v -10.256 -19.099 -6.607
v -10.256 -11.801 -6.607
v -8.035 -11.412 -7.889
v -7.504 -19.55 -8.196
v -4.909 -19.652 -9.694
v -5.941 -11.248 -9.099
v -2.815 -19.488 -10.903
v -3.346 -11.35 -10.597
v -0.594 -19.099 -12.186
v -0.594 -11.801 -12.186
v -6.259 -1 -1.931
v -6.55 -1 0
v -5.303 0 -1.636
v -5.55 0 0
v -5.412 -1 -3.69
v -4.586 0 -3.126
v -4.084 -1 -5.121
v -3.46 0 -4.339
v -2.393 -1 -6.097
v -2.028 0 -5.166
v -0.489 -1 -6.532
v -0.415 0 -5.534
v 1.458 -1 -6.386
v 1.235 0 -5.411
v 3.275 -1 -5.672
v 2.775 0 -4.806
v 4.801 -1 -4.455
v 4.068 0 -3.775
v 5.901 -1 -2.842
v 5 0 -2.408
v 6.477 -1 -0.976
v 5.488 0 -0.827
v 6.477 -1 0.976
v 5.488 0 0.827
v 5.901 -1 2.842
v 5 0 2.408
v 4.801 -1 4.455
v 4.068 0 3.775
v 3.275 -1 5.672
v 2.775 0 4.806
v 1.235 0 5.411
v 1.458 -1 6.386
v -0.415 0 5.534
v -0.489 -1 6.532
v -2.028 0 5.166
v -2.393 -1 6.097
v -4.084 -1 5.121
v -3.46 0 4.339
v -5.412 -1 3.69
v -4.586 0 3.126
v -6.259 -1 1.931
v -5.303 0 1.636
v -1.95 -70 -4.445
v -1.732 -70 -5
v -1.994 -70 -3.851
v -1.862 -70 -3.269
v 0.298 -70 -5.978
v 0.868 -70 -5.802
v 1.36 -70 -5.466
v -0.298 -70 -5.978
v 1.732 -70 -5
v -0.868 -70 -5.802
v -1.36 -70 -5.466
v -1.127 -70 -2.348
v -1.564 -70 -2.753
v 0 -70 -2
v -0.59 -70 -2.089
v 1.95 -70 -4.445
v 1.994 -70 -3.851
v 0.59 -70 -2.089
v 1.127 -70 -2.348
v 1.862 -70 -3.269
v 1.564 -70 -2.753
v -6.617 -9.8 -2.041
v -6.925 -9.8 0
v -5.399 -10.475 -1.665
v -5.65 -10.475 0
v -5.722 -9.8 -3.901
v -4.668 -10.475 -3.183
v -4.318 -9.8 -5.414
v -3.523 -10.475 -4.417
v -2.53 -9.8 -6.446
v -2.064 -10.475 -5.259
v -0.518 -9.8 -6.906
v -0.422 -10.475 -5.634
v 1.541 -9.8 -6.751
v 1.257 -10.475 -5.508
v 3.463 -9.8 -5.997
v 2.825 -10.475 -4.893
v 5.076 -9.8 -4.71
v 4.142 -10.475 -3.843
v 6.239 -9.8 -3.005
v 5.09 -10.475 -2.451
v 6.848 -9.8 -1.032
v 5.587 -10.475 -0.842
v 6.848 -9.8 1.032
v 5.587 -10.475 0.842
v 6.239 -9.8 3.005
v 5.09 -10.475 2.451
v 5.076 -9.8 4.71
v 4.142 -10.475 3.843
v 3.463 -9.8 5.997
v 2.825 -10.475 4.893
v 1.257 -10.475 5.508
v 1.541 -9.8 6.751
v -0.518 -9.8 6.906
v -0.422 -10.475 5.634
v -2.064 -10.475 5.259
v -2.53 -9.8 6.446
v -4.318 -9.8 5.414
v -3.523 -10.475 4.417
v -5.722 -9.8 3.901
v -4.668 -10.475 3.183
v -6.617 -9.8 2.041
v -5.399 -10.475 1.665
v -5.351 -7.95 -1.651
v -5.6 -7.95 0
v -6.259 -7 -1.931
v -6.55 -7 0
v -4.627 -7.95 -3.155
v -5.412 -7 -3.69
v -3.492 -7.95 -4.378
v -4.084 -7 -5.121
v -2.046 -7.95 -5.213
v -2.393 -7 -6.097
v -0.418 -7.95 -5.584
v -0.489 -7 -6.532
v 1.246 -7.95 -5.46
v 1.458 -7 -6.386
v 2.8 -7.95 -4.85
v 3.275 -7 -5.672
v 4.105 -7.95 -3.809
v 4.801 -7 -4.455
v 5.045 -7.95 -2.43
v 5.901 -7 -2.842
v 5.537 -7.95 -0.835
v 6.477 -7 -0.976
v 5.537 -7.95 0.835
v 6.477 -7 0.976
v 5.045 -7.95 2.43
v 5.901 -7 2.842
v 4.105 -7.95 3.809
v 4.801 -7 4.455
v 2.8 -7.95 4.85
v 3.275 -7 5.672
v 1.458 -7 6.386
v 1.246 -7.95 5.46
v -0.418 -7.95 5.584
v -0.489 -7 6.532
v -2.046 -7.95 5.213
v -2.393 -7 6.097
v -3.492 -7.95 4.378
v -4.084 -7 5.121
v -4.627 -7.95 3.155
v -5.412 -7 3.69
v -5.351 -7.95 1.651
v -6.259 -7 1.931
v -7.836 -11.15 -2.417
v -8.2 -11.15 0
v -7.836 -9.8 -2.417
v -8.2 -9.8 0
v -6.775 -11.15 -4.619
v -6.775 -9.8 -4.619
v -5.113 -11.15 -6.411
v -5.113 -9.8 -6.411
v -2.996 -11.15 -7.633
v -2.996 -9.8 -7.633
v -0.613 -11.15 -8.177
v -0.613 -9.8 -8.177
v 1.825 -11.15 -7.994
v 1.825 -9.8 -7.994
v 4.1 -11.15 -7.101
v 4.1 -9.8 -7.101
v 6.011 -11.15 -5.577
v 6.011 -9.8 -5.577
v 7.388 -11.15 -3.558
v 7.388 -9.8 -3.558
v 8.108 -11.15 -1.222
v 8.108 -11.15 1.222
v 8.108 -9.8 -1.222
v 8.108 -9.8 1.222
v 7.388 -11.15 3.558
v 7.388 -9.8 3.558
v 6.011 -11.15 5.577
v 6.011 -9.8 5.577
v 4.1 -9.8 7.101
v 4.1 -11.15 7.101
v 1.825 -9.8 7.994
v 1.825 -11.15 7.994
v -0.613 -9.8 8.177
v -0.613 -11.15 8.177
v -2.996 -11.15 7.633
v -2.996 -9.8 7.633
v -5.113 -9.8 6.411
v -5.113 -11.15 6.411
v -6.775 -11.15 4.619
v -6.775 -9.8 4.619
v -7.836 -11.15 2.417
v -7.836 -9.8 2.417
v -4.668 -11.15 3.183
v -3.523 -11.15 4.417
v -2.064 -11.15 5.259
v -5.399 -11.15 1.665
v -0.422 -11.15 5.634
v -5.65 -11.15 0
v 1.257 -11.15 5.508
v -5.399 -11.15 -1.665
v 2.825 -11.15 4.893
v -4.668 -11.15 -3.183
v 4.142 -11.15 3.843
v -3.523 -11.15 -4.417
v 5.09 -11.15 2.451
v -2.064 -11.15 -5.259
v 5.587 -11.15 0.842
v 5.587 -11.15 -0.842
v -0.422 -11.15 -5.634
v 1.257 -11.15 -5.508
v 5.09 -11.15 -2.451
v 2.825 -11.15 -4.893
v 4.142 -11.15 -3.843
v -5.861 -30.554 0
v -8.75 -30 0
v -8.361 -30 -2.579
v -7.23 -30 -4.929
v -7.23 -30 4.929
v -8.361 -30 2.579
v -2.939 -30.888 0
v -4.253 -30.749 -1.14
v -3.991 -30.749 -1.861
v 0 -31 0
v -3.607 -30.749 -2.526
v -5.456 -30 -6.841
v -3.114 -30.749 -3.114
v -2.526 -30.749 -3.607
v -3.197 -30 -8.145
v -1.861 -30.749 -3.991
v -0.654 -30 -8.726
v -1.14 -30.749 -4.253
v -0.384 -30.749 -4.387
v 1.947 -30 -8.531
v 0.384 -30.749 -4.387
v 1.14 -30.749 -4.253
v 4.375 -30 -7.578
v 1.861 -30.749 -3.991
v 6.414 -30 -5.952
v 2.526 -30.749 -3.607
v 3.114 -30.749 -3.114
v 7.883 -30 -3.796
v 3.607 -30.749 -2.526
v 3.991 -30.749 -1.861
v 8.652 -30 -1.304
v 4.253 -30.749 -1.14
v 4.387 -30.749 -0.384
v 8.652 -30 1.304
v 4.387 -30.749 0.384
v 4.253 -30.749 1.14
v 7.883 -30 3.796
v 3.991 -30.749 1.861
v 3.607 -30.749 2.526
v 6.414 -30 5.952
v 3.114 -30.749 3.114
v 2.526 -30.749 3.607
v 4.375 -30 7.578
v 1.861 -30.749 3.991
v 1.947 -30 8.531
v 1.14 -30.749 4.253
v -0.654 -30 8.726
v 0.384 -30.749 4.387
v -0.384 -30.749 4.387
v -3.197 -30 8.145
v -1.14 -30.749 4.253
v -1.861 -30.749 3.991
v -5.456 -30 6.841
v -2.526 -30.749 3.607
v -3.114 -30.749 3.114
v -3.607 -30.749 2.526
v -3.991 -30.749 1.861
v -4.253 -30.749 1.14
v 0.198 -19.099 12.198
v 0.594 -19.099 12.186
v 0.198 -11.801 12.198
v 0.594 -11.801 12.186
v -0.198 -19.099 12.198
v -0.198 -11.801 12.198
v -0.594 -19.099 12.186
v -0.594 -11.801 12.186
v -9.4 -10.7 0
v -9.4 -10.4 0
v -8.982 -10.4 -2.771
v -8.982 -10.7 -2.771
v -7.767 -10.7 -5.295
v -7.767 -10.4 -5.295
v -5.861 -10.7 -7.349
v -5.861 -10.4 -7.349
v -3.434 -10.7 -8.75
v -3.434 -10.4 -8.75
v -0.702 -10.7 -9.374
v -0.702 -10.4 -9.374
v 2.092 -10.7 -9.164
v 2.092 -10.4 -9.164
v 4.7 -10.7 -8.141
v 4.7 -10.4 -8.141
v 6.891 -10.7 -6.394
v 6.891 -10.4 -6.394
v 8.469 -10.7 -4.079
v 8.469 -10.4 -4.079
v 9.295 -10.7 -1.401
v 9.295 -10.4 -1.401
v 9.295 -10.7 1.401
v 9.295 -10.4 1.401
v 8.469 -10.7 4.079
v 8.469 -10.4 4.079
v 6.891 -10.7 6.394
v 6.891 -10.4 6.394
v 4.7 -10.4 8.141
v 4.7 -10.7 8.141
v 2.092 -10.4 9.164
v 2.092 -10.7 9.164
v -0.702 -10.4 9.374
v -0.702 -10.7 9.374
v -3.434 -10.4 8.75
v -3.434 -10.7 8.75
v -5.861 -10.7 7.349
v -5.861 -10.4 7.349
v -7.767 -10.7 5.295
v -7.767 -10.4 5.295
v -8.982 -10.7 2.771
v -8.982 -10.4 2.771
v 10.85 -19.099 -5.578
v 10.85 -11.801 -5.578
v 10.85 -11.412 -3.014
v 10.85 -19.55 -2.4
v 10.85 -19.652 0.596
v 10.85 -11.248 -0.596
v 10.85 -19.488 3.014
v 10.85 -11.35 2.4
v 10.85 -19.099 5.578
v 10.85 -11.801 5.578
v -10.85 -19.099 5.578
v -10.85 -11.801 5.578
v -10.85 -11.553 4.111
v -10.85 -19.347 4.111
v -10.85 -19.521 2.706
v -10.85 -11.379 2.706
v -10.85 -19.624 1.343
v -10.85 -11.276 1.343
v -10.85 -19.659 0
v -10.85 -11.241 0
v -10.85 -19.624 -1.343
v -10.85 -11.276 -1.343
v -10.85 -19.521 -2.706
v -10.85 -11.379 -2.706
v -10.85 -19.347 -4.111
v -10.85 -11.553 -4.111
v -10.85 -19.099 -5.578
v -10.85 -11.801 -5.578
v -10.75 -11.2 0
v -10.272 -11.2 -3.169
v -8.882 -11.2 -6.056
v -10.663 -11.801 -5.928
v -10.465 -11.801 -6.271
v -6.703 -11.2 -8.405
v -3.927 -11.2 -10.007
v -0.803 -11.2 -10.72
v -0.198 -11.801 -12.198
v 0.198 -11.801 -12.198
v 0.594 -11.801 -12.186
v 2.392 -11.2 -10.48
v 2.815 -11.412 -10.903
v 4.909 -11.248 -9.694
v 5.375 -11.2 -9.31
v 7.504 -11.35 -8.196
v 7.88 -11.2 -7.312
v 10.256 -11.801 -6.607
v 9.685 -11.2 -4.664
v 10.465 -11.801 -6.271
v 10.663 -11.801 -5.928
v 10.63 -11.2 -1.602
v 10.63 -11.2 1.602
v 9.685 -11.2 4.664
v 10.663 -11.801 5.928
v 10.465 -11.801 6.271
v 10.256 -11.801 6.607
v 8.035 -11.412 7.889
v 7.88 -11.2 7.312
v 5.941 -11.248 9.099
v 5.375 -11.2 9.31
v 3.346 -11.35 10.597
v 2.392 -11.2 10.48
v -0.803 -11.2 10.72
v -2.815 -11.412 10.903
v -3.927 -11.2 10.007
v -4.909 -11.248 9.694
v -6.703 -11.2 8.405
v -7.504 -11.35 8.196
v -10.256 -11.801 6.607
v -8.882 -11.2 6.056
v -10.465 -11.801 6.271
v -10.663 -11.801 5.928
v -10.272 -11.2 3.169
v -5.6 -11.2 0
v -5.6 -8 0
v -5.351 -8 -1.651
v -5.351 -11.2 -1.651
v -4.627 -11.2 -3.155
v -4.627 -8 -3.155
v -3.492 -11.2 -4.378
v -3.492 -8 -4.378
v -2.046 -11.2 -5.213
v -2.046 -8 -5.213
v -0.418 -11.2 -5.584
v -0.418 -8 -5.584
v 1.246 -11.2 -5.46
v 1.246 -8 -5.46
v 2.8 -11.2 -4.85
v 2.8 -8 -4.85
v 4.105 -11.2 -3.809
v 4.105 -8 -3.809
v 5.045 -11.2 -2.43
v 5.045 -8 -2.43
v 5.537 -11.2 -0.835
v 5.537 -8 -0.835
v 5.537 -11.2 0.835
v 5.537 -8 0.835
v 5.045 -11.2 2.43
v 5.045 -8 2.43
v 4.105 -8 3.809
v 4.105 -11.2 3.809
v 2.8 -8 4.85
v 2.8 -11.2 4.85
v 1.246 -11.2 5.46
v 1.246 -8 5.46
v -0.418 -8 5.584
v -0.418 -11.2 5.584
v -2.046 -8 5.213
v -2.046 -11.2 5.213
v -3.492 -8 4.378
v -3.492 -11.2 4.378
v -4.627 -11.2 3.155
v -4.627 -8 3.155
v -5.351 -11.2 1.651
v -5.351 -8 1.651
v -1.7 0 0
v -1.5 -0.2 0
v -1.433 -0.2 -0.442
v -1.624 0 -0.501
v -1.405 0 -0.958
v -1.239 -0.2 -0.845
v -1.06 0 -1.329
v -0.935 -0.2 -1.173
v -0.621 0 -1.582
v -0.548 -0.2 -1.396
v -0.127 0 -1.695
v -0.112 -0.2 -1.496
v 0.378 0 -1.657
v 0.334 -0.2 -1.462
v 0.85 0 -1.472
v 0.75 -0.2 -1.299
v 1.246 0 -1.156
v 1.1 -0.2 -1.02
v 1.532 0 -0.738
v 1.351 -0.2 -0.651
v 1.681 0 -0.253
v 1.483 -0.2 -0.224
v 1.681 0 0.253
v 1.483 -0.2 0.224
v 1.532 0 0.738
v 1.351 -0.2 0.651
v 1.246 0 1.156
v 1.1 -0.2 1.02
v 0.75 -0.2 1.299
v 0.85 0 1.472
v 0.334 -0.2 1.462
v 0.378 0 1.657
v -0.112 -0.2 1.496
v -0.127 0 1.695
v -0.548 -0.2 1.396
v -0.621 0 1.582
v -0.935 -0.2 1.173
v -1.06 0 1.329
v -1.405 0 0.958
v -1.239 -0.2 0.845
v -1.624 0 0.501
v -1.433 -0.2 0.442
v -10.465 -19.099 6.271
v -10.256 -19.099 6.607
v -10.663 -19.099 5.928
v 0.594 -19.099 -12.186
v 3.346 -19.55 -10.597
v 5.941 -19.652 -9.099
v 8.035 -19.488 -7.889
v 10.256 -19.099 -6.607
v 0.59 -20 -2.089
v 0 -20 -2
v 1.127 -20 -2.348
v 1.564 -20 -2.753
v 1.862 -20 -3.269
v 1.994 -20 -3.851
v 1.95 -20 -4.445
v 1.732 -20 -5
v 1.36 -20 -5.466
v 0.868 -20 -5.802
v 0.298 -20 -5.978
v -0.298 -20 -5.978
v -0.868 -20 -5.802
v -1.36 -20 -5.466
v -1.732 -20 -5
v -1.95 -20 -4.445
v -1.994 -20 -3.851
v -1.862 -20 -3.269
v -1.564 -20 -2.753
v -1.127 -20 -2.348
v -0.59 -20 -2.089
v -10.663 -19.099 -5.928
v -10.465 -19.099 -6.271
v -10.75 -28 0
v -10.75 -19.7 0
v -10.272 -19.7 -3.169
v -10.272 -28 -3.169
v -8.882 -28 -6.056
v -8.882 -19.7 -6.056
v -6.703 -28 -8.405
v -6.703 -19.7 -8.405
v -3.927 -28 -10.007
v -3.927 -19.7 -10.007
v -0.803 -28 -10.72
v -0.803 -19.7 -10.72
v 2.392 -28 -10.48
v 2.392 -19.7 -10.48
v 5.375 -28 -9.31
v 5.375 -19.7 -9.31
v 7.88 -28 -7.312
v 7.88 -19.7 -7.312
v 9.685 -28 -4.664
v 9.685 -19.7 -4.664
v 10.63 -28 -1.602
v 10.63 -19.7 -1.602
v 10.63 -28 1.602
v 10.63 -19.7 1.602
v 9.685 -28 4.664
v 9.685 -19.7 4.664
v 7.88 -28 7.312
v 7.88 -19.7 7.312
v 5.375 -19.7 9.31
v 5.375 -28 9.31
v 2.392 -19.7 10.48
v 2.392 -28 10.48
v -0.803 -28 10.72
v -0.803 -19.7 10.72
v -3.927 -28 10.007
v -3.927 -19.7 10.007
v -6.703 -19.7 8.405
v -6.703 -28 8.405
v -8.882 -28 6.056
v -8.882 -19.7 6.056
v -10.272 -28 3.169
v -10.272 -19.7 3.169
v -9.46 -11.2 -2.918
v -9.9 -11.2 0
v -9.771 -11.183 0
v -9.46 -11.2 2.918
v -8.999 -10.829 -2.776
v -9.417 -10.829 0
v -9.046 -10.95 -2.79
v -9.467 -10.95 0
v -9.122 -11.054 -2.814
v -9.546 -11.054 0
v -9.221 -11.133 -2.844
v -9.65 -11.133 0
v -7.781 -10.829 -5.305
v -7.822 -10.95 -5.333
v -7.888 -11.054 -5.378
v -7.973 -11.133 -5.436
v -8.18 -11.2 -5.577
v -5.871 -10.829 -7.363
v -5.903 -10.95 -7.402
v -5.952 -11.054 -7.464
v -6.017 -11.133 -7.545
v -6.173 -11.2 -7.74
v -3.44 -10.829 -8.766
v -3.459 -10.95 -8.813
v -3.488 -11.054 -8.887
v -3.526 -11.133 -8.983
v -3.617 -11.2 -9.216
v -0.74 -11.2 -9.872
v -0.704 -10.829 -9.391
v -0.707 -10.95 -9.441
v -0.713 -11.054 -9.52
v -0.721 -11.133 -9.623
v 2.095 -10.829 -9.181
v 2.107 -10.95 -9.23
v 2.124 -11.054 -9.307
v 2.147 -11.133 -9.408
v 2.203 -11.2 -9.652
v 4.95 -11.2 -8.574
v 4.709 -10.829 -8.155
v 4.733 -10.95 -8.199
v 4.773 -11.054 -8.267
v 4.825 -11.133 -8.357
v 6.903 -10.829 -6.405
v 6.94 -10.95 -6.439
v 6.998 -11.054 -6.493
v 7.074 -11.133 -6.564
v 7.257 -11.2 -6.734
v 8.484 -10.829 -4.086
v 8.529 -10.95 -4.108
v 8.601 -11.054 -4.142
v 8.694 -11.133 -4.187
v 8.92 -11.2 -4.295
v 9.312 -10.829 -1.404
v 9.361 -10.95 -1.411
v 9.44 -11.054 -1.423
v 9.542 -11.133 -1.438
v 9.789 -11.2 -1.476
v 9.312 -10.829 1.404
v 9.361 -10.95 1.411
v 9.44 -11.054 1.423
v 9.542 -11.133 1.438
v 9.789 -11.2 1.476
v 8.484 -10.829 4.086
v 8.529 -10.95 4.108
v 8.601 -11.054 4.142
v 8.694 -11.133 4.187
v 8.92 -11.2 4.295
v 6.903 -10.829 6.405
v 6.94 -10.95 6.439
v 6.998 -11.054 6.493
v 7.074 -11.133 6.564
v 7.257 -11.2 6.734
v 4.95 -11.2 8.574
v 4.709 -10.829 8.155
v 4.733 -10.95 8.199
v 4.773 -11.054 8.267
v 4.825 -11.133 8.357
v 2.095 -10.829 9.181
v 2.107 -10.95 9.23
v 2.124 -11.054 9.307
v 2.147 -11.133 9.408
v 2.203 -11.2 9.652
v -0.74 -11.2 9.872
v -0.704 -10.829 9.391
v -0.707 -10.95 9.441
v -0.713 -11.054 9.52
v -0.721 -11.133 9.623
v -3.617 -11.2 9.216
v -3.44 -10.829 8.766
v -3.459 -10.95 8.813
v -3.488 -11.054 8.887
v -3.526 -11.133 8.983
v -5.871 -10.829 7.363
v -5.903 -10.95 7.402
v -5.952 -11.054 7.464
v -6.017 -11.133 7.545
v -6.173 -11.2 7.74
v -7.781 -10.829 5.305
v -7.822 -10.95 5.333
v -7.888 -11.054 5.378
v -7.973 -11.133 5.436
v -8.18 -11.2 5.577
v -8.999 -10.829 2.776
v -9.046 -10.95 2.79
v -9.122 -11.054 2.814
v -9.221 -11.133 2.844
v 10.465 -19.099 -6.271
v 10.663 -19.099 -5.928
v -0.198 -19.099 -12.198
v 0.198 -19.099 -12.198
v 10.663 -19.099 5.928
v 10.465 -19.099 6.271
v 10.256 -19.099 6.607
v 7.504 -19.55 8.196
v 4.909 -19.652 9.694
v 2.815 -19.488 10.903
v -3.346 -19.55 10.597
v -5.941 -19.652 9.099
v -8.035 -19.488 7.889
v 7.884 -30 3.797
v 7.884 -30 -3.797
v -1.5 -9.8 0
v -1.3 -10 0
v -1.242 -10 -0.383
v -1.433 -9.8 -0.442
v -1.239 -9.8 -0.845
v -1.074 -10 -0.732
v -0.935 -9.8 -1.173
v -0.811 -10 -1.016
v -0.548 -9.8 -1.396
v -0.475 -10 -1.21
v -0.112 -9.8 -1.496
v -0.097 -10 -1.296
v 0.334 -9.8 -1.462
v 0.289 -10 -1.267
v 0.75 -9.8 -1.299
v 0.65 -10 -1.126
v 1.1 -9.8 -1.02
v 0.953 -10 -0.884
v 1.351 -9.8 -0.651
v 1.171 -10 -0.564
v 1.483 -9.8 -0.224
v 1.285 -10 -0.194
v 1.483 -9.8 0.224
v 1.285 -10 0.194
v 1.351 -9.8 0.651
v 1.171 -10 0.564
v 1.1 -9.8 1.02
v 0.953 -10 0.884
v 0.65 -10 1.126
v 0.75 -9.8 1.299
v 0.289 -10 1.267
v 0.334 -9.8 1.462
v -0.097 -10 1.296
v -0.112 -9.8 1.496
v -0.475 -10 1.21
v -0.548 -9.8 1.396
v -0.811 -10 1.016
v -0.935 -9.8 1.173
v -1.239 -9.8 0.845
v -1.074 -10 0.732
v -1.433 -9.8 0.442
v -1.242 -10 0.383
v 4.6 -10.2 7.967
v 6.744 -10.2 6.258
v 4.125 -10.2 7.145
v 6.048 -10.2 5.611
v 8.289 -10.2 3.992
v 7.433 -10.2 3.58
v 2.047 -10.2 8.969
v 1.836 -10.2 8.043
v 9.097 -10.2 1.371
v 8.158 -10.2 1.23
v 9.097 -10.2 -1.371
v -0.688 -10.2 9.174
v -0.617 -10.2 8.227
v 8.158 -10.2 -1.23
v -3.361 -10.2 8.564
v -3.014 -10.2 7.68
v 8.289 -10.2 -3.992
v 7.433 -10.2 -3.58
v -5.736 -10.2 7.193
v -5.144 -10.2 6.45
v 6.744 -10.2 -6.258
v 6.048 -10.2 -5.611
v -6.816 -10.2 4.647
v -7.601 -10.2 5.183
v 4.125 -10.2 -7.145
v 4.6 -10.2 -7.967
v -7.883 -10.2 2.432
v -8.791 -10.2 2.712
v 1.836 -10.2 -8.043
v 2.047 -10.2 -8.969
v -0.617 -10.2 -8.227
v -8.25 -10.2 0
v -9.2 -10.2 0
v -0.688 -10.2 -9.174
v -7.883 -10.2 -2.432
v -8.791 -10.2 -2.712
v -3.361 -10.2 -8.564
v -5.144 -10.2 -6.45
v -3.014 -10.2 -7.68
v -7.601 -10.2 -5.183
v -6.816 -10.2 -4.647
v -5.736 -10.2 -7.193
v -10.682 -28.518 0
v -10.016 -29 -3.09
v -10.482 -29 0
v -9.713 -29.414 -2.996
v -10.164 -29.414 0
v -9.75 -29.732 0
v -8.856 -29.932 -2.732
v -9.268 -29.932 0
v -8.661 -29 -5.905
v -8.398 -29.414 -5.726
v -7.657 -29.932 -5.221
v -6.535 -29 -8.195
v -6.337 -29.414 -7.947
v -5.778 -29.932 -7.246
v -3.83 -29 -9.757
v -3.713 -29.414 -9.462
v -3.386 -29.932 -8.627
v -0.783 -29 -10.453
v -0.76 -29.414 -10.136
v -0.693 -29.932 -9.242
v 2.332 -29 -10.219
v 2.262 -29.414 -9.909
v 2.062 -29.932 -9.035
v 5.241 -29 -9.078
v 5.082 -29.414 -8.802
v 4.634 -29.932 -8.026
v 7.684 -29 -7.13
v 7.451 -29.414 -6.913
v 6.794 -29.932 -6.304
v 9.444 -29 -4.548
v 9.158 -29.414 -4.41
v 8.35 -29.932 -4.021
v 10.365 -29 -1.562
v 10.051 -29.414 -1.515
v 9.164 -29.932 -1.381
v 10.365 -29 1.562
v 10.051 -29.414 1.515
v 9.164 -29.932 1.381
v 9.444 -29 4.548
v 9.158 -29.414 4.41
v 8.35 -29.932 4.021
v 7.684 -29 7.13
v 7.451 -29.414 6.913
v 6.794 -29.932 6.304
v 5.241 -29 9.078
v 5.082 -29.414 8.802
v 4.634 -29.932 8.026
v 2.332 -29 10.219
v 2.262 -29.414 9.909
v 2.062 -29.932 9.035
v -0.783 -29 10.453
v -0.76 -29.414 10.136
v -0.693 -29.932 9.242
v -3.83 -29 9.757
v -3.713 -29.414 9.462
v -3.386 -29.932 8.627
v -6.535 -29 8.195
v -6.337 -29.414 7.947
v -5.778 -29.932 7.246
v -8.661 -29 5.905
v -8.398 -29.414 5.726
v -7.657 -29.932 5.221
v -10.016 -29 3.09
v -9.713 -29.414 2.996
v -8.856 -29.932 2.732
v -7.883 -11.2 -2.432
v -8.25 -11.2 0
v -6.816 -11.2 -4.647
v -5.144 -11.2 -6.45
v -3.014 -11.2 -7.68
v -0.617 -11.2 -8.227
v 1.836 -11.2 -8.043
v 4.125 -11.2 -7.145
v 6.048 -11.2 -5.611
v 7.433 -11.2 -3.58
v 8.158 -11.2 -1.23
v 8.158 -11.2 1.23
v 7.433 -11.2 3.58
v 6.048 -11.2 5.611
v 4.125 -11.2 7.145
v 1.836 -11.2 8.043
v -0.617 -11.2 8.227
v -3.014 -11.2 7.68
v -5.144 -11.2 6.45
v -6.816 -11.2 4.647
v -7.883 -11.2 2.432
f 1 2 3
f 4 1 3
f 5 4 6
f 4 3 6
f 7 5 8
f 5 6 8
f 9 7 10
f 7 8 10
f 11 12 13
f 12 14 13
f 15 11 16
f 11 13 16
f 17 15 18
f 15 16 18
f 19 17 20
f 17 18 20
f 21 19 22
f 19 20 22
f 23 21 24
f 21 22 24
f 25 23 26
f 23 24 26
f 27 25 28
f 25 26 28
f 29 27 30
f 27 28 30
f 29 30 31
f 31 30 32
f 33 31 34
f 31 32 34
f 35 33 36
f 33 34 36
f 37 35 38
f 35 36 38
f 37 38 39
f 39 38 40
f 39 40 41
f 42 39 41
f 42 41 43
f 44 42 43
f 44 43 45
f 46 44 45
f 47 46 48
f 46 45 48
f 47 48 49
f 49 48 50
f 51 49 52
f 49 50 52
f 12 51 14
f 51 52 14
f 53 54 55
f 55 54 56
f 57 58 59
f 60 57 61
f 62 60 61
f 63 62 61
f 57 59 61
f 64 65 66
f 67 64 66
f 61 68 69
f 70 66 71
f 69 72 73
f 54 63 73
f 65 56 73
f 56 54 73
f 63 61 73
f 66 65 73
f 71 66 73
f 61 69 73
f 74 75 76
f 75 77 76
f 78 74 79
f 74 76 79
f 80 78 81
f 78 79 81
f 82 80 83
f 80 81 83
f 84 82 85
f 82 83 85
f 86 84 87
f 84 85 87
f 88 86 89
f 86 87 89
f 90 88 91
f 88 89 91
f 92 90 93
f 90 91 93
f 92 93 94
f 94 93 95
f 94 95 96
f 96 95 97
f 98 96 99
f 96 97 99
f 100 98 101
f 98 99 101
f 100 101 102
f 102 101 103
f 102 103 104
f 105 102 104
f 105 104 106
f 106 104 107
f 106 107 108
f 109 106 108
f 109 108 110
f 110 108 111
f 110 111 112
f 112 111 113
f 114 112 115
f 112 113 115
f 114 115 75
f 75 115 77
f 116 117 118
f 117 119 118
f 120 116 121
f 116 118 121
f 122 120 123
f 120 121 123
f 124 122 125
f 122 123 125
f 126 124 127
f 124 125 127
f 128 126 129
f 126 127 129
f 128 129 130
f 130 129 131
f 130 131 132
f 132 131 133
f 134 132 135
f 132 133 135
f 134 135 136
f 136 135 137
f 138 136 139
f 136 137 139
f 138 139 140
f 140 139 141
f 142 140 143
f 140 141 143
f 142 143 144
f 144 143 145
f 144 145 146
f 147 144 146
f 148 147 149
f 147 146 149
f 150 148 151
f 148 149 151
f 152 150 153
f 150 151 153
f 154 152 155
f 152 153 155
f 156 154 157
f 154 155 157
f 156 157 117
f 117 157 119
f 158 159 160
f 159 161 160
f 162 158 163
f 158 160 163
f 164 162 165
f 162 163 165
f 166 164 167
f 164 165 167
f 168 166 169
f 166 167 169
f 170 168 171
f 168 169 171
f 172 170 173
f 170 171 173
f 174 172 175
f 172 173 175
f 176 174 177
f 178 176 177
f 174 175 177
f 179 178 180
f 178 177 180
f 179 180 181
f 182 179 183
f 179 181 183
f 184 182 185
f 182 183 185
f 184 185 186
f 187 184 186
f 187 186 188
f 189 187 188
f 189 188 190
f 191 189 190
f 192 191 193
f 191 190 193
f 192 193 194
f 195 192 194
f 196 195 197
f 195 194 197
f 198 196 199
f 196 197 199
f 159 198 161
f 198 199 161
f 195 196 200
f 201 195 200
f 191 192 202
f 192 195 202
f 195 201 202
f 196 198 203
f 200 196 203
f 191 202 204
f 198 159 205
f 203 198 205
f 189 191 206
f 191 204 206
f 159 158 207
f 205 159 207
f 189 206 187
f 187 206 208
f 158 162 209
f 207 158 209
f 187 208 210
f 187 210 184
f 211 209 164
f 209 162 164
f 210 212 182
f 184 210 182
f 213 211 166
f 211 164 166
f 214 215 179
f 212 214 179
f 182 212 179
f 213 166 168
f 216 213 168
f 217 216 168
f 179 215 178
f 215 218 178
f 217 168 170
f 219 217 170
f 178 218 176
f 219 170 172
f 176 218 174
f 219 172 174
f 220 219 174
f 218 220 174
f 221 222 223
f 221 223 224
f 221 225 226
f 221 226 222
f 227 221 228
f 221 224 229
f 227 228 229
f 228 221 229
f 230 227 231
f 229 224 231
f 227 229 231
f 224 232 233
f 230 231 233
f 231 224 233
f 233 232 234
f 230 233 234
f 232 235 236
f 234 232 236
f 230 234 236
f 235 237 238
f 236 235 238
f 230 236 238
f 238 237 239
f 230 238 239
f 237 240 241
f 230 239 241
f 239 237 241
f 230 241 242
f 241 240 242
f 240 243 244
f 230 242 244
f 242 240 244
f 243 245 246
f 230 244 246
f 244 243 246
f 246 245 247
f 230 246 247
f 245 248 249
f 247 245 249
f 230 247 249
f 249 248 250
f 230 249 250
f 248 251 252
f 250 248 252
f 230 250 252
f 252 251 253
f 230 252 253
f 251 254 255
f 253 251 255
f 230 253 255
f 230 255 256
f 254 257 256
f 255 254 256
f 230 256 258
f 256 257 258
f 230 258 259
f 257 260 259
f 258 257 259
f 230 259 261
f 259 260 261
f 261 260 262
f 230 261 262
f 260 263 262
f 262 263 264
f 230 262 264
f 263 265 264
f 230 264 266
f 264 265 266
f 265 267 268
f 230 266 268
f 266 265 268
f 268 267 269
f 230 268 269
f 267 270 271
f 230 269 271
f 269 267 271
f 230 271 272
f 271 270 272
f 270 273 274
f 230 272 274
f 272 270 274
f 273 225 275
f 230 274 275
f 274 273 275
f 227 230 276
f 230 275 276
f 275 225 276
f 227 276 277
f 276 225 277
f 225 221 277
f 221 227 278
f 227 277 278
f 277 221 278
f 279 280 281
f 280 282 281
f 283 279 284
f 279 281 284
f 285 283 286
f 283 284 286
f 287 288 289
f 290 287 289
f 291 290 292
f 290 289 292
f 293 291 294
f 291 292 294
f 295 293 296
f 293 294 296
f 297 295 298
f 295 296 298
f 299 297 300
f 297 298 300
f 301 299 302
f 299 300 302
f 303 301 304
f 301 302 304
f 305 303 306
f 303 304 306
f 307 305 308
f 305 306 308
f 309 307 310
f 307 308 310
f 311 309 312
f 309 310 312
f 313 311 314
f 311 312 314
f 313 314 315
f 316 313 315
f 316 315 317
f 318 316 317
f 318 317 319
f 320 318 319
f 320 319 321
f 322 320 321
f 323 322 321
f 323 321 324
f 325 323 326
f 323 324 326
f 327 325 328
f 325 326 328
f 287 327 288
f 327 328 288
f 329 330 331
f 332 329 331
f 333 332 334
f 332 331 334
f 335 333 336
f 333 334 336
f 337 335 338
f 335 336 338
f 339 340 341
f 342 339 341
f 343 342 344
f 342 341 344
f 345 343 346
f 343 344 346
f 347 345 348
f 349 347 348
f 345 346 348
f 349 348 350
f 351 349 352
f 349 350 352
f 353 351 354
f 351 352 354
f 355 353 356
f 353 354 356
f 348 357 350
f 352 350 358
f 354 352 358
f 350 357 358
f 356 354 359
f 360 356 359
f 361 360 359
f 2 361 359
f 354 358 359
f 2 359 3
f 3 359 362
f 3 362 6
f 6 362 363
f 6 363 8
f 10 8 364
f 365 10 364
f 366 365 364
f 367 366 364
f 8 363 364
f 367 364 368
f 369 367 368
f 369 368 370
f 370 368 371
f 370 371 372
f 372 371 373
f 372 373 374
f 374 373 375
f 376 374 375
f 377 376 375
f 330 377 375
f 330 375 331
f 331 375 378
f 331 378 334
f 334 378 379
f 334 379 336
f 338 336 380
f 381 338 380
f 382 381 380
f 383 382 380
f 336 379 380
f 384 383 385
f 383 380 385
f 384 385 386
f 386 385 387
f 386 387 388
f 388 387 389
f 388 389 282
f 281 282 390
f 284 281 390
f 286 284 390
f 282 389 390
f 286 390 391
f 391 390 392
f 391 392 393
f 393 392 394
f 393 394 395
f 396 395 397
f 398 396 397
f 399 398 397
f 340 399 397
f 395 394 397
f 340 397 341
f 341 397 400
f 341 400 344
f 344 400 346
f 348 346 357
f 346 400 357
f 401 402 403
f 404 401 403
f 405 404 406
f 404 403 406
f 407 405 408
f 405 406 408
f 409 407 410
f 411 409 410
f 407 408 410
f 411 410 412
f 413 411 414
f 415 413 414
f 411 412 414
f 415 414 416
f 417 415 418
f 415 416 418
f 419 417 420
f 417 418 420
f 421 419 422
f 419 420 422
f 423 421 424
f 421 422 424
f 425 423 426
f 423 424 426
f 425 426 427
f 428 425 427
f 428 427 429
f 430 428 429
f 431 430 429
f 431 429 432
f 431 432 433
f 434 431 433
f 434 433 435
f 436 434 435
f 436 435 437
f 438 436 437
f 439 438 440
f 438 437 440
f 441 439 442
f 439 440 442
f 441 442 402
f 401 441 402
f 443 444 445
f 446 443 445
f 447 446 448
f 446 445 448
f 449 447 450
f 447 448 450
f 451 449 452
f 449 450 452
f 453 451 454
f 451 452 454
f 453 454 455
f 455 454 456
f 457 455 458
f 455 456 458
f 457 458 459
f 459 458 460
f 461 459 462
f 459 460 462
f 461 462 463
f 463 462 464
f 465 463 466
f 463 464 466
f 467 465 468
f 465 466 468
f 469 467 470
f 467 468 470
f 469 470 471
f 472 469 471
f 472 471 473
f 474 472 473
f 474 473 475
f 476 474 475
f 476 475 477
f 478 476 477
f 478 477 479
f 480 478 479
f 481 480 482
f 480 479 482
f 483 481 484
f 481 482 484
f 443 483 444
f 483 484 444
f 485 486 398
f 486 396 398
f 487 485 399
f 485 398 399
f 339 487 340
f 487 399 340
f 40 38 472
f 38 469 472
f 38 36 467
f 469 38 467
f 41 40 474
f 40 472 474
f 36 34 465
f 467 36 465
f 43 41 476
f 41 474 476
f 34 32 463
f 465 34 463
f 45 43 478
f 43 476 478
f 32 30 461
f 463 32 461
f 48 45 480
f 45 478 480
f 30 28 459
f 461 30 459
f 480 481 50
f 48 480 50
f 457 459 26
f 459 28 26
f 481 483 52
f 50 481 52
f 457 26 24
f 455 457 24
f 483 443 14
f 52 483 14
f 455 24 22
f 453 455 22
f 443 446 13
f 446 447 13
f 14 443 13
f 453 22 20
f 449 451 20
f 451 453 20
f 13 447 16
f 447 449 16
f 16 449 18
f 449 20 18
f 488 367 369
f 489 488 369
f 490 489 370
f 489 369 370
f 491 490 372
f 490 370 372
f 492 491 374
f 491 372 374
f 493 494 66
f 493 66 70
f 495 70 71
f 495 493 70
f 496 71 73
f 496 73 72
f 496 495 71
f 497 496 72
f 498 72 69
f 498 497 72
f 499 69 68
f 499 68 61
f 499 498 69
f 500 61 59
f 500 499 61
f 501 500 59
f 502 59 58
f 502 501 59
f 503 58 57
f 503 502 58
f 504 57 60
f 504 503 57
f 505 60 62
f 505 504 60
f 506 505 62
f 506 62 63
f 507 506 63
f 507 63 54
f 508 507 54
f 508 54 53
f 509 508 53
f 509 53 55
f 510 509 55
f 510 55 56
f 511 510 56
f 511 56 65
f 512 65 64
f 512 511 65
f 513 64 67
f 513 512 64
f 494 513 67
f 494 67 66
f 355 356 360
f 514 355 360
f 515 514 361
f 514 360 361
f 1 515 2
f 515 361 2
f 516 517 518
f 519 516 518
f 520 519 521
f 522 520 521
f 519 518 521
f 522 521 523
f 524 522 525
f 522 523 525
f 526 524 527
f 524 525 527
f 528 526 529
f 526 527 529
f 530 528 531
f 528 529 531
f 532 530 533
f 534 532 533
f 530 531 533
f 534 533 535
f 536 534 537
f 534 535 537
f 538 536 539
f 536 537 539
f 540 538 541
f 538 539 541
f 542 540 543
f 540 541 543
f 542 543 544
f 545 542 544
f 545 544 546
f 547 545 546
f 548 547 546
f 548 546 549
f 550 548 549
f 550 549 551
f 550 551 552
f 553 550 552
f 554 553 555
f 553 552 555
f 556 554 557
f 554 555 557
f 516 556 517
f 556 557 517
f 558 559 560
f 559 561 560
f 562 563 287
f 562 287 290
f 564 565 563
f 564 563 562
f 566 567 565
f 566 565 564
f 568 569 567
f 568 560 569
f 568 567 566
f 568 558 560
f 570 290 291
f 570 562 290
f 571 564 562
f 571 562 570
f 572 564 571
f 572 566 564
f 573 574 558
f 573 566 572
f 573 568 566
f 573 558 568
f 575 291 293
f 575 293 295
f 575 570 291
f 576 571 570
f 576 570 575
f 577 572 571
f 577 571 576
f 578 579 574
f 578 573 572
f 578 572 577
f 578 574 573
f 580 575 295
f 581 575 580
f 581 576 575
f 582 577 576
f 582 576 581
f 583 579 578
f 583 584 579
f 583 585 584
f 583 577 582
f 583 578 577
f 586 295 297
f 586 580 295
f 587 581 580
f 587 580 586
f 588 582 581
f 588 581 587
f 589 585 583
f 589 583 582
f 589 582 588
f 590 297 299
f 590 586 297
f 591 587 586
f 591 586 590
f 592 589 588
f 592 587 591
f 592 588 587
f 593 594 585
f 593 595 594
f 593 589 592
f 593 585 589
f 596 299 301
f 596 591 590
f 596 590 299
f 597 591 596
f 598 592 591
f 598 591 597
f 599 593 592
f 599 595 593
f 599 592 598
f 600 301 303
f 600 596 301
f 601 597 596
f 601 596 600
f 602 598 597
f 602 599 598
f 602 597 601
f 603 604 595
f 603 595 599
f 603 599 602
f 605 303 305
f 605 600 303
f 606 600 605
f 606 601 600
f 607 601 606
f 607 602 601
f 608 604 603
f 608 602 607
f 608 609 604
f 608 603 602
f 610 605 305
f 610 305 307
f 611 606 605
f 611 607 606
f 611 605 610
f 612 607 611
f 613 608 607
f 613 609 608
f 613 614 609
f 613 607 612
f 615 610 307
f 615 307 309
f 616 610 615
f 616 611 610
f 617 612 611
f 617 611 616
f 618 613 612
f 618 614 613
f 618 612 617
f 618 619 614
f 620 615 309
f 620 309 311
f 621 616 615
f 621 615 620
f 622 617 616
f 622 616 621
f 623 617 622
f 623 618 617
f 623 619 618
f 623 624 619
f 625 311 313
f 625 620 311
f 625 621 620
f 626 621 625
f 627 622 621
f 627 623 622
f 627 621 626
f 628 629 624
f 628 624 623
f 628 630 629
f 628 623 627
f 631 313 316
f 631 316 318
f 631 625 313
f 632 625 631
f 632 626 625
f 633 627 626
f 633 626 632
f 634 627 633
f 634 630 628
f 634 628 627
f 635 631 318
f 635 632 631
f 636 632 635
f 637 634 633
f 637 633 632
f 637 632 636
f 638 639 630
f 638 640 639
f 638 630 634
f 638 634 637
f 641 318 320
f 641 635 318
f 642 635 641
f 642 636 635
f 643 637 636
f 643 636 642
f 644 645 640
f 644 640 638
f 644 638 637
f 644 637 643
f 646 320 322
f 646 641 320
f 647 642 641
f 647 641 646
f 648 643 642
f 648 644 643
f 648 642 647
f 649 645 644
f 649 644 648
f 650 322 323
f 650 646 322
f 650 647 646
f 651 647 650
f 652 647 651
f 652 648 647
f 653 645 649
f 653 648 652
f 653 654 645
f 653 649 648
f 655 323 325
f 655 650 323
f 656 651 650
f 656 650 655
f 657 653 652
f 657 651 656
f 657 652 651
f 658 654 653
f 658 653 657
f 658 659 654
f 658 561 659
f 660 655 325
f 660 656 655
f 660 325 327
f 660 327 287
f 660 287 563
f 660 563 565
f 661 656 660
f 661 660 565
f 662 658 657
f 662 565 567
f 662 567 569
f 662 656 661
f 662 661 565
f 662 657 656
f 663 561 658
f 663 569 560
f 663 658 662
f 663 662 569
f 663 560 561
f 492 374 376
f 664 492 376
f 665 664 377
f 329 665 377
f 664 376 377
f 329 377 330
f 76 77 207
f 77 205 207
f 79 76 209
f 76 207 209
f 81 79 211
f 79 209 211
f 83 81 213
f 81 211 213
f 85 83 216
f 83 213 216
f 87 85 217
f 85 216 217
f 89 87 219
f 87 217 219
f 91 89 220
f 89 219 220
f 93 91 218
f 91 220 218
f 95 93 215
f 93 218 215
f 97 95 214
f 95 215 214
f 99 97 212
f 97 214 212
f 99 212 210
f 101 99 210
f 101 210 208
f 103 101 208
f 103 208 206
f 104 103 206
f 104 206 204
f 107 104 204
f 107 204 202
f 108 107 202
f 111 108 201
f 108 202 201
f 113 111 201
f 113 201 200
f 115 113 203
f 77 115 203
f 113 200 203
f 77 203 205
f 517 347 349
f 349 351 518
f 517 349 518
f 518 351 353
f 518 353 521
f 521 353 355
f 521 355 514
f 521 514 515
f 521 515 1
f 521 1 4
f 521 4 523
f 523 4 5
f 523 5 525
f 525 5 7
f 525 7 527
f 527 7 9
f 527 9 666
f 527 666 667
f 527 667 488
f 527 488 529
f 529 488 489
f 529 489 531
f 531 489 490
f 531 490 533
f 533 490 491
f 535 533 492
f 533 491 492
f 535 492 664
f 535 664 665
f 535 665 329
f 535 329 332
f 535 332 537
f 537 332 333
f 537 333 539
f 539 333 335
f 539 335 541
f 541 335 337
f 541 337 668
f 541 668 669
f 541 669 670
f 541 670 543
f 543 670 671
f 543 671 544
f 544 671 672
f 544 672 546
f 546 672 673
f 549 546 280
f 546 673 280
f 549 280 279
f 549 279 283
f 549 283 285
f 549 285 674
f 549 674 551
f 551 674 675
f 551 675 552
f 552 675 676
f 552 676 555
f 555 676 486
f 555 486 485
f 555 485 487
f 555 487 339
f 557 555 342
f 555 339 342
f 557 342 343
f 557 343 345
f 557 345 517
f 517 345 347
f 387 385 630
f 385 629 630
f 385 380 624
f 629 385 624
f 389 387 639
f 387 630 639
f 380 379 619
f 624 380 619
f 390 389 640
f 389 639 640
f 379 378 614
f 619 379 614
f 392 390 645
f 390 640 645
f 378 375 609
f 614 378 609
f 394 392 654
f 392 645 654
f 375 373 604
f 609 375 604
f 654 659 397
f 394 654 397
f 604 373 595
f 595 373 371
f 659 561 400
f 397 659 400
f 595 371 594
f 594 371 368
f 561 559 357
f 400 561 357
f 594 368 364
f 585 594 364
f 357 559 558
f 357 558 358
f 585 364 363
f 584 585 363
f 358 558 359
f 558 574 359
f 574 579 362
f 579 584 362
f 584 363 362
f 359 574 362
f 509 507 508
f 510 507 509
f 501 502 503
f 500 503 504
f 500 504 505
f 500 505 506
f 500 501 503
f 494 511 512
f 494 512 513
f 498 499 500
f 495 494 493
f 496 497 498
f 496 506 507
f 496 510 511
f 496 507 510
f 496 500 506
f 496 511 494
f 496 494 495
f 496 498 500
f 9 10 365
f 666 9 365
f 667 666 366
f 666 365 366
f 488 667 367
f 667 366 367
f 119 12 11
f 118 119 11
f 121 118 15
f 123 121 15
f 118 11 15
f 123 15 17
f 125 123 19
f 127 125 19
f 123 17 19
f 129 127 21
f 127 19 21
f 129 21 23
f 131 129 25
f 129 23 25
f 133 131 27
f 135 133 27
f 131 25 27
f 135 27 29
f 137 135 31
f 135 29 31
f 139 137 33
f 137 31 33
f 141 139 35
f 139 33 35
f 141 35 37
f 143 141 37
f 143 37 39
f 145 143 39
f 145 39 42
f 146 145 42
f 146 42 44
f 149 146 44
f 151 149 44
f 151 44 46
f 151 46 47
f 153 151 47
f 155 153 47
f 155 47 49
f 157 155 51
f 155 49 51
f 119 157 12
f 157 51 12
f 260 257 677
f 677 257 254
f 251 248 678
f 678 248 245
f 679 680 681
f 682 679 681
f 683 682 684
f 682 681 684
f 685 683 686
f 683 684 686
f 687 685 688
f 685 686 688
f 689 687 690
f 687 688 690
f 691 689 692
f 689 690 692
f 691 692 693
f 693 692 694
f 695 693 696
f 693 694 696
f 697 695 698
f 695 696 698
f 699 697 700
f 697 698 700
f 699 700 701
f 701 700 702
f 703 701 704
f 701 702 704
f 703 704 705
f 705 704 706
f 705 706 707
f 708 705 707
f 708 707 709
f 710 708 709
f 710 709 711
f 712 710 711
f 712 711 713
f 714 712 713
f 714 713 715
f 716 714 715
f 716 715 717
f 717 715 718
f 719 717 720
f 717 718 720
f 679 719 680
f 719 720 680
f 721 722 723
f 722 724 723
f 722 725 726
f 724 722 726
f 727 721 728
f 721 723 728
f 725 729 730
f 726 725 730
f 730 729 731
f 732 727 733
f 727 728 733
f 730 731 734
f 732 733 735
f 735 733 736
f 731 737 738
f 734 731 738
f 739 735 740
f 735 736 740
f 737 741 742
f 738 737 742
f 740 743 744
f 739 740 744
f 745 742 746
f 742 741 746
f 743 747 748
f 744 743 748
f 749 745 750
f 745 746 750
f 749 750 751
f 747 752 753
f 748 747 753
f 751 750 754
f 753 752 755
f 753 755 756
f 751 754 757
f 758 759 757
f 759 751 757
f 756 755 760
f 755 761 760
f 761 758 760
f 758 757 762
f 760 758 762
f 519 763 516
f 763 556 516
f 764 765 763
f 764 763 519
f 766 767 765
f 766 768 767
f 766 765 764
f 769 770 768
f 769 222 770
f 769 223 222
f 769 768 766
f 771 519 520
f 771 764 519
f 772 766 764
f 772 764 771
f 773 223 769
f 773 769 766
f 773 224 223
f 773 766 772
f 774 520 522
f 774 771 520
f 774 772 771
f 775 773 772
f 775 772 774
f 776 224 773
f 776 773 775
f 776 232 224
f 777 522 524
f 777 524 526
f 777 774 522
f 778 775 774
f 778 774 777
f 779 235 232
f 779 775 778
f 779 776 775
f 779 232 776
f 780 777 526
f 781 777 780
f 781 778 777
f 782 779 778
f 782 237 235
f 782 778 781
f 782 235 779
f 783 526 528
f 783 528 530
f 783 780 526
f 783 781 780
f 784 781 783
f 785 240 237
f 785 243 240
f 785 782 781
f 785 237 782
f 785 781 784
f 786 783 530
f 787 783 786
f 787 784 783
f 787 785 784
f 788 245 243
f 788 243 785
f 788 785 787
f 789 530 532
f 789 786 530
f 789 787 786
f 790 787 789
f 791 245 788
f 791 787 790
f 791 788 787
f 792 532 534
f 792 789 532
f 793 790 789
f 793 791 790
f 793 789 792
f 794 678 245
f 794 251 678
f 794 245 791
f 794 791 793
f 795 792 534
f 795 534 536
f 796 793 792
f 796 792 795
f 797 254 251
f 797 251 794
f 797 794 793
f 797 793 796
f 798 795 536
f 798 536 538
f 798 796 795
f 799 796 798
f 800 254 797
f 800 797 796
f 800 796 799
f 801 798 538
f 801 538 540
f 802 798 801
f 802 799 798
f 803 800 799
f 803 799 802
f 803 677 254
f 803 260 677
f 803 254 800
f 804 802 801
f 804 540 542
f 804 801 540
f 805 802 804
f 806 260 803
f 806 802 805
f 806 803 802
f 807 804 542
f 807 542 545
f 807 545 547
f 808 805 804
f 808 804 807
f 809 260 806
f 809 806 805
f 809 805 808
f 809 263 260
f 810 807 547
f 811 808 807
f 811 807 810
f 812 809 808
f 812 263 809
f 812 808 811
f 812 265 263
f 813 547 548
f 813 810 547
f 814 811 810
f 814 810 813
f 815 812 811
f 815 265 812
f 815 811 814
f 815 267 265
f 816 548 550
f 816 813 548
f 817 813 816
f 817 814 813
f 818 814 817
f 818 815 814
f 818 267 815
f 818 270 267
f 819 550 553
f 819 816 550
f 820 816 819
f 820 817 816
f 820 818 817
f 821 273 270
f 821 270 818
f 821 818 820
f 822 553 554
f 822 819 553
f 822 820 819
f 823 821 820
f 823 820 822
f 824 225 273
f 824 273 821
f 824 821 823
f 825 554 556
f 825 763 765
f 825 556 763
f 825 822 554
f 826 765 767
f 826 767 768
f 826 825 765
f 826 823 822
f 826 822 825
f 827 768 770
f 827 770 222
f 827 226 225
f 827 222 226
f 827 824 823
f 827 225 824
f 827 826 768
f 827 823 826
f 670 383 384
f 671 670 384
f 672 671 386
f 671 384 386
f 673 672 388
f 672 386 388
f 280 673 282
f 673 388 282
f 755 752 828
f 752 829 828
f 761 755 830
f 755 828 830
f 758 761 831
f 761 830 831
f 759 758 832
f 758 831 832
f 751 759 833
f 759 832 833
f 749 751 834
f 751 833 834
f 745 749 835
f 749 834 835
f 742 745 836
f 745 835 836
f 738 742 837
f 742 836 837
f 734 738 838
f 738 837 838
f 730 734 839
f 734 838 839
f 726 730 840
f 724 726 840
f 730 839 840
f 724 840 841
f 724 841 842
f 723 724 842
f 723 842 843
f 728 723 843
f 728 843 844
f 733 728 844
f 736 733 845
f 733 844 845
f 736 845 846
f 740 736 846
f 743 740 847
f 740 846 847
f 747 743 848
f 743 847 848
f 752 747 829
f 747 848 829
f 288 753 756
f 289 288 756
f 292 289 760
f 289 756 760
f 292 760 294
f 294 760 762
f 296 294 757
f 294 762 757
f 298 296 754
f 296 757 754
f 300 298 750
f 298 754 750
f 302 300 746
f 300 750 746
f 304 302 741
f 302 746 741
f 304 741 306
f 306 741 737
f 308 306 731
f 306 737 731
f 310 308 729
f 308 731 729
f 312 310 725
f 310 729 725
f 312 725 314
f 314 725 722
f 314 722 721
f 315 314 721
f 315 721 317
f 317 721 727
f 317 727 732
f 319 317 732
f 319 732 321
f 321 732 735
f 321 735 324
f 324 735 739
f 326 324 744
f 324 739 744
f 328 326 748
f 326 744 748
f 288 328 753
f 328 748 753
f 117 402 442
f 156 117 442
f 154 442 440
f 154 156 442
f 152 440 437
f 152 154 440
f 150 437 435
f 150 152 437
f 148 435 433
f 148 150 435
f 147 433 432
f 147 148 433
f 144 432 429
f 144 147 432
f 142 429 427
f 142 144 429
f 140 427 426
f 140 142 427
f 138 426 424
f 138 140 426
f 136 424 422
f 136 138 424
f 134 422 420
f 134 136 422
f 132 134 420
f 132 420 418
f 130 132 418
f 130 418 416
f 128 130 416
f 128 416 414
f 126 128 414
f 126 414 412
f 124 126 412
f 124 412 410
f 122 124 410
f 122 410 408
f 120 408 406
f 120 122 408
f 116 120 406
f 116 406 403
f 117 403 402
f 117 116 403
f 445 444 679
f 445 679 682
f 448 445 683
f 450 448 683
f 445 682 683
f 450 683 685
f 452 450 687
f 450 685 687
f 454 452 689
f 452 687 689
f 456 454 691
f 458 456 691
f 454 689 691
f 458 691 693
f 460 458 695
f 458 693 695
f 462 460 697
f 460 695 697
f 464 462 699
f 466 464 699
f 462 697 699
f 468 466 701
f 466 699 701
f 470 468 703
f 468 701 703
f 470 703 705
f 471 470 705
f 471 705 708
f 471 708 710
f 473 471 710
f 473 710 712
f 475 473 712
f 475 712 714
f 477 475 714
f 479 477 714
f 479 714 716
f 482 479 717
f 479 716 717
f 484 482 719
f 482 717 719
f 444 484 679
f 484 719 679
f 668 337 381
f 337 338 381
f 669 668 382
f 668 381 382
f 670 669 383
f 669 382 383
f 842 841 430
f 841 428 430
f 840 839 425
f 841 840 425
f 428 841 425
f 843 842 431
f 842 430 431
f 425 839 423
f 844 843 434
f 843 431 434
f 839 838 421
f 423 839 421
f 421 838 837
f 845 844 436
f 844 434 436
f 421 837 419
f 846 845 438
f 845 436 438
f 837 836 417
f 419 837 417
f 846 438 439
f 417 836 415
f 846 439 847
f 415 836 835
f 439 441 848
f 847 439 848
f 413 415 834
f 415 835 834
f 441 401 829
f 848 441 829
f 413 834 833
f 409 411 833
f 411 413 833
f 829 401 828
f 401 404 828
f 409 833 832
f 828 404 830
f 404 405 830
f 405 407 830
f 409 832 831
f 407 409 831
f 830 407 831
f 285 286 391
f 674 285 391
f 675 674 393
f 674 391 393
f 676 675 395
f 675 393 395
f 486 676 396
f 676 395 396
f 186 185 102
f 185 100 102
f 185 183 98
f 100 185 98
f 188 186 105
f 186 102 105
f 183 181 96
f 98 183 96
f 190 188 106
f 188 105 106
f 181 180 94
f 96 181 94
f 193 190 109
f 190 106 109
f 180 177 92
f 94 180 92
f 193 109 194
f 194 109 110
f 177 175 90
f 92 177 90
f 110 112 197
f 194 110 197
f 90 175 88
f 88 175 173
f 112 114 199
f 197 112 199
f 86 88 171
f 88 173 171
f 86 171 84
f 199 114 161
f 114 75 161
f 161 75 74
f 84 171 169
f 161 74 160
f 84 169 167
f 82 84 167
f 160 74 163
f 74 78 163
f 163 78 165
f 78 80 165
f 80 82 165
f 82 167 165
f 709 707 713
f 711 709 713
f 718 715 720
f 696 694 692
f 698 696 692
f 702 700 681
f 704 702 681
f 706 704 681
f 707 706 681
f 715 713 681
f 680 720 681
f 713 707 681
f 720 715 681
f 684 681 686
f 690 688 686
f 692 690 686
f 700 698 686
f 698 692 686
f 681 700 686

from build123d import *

# Parameters (mm, degrees)
CUT_EXTRUDE2_DEPTH  = 36.477880433
FILLET1_R           = 2
CHAMFER1_SIZE       = 1
CHAMFER2_SIZE       = 0.2
FILLET2_R           = 0.5
BOSS_EXTRUDE1_START = -20
SKETCH5_R           = 2
BOSS_EXTRUDE1_DEPTH = 50


# Some blends are built 0.0001 mm under size
with BuildPart() as part:
    # Sketch1 → Revolve1 (revolve)
    with BuildSketch(Plane.XY, mode=Mode.PRIVATE) as revolve1_sk:
        with BuildLine():
            Line((10.75, -30), (10.75, -19.7))
            Line((10.75, -19.7), (12.2, -19.099390335))
            Line((12.2, -19.099390335), (12.2, -11.800609665))
            Line((12.2, -11.800609665), (10.75, -11.2))
            Line((10.75, -11.2), (9.4, -11.2))
            Line((9.4, -11.2), (9.4, -10.2))
            Line((9.4, -10.2), (8.25, -10.2))
            Line((8.25, -10.2), (8.25, -11.2))
            Line((8.25, -11.2), (5.6, -11.2))
            Line((5.6, -11.2), (5.6, -8))
            Line((5.6, -8), (6.55, -8))
            Line((6.55, -8), (6.55, 0))
            Line((6.55, 0), (1.5, 0))
            Line((1.5, 0), (1.5, -10))
            Line((1.5, -10), (0, -10))
            Line((0, -10), (0, -31))
            ThreePointArc((0, -31), (4.403478738, -30.749188961), (8.75, -30))
            Line((8.75, -30), (10.75, -30))
        make_face()
        Polygon((5.65, -11.15), (8.2, -11.15), (8.2, -9.8), (6.925, -9.8), (5.65, -10.475), align=None)
    revolve(revolve1_sk.sketch.rotate(Axis((0, 0, 0), (0, -1, 0)), 180), axis=Axis((0, 0, 0), (0, -1, 0)))

    # Sketch2 → Cut-Extrude2 (cut, through all)
    with BuildSketch(Plane(origin=(0, 0, 0), x_dir=(1, 0, 0), z_dir=(0, 1, 0))):
        with BuildLine():
            Line((-10.255954875, 6.607222534), (-0.594045125, 12.185528728))
            ThreePointArc((-0.594045125, 12.185528728), (-6.1, 10.565509926), (-10.255954875, 6.607222534))
        make_face()
        with BuildLine():
            ThreePointArc((10.255954875, 6.607222534), (6.1, 10.565509926), (0.594045125, 12.185528728))
            Line((0.594045125, 12.185528728), (10.255954875, 6.607222534))
        make_face()
        with BuildLine():
            ThreePointArc((12.2, 0), (11.857697922, 2.86966897), (10.85, 5.578306195))
            Line((10.85, 5.578306195), (10.85, -5.578306195))
            ThreePointArc((10.85, -5.578306195), (11.857697922, -2.86966897), (12.2, 0))
        make_face()
        with BuildLine():
            ThreePointArc((0.594045125, -12.185528728), (6.1, -10.565509926), (10.255954875, -6.607222534))
            Line((10.255954875, -6.607222534), (0.594045125, -12.185528728))
        make_face()
        with BuildLine():
            Line((-0.594045125, -12.185528728), (-10.255954875, -6.607222534))
            ThreePointArc((-10.255954875, -6.607222534), (-6.1, -10.565509926), (-0.594045125, -12.185528728))
        make_face()
        with BuildLine():
            Line((-10.85, -5.578306195), (-10.85, 5.578306195))
            ThreePointArc((-10.85, 5.578306195), (-12.2, 0), (-10.85, -5.578306195))
        make_face()
    extrude(amount=-CUT_EXTRUDE2_DEPTH, mode=Mode.SUBTRACT)

    # Fillet1
    fillet1_edges = [part.edges().sort_by_distance(p)[0] for p in [
        (10.75, -30, 0),
    ]]
    fillet(fillet1_edges, radius=FILLET1_R - 0.0001)  # a hair under: the kernel refuses the full size

    # Chamfer1
    # the kernel refuses this chamfer: 1 mm, written as the material it takes off along each edge
    with BuildSketch(Plane(origin=(0, -8, 0), x_dir=(-1, 0, 0), z_dir=(0, 0, 1))) as chamfer1_piece_1_section:
        Polygon((6.55 - CHAMFER1_SIZE, 0), (6.55, -CHAMFER1_SIZE), (6.55, 0), align=None)
    chamfer1_piece_1 = revolve(axis=Axis((0, -8, 0), (0, -1, 0)), mode=Mode.PRIVATE)
    chamfer1_piece_1 = chamfer1_piece_1 - Plane(origin=(0, -7.480474421, 0), x_dir=(-1, 0, 0), z_dir=(0, 1, 0)) * Cylinder(5.6, 27, mode=Mode.PRIVATE)
    add(chamfer1_piece_1, mode=Mode.SUBTRACT)
    with BuildSketch(Plane(origin=(0, 0, 0), x_dir=(-1, 0, 0), z_dir=(0, 0, 1))) as chamfer1_piece_2:
        Polygon((6.55, CHAMFER1_SIZE), (6.55 - CHAMFER1_SIZE, 0), (6.55, 0), align=None)
    revolve(axis=Axis((0, 0, 0), (0, -1, 0)), mode=Mode.SUBTRACT)

    # Chamfer2
    chamfer2_edges = [part.edges().sort_by_distance(p)[0] for p in [
        (9.4, -10.2, 0),
        (1.5, 0, 0),
        (1.5, -10, 0),
    ]]
    chamfer(chamfer2_edges, length=CHAMFER2_SIZE)

    # Fillet2
    fillet2_edges = [part.edges().sort_by_distance(p)[0] for p in [
        (9.4, -11.2, 0),
    ]]
    fillet(fillet2_edges, radius=FILLET2_R)


with BuildPart() as body_2:
    # Sketch5 → Boss-Extrude1 (new body)
    with BuildSketch(Plane(origin=(0, 0, 0), x_dir=(1, 0, 0), z_dir=(0, 1, 0)).offset(BOSS_EXTRUDE1_START)):
        with Locations(Location((0, 4, 0), (0, 0, 270))):
            Circle(SKETCH5_R)
    extrude(amount=-BOSS_EXTRUDE1_DEPTH)


solid = Compound([part.part, body_2.part])
